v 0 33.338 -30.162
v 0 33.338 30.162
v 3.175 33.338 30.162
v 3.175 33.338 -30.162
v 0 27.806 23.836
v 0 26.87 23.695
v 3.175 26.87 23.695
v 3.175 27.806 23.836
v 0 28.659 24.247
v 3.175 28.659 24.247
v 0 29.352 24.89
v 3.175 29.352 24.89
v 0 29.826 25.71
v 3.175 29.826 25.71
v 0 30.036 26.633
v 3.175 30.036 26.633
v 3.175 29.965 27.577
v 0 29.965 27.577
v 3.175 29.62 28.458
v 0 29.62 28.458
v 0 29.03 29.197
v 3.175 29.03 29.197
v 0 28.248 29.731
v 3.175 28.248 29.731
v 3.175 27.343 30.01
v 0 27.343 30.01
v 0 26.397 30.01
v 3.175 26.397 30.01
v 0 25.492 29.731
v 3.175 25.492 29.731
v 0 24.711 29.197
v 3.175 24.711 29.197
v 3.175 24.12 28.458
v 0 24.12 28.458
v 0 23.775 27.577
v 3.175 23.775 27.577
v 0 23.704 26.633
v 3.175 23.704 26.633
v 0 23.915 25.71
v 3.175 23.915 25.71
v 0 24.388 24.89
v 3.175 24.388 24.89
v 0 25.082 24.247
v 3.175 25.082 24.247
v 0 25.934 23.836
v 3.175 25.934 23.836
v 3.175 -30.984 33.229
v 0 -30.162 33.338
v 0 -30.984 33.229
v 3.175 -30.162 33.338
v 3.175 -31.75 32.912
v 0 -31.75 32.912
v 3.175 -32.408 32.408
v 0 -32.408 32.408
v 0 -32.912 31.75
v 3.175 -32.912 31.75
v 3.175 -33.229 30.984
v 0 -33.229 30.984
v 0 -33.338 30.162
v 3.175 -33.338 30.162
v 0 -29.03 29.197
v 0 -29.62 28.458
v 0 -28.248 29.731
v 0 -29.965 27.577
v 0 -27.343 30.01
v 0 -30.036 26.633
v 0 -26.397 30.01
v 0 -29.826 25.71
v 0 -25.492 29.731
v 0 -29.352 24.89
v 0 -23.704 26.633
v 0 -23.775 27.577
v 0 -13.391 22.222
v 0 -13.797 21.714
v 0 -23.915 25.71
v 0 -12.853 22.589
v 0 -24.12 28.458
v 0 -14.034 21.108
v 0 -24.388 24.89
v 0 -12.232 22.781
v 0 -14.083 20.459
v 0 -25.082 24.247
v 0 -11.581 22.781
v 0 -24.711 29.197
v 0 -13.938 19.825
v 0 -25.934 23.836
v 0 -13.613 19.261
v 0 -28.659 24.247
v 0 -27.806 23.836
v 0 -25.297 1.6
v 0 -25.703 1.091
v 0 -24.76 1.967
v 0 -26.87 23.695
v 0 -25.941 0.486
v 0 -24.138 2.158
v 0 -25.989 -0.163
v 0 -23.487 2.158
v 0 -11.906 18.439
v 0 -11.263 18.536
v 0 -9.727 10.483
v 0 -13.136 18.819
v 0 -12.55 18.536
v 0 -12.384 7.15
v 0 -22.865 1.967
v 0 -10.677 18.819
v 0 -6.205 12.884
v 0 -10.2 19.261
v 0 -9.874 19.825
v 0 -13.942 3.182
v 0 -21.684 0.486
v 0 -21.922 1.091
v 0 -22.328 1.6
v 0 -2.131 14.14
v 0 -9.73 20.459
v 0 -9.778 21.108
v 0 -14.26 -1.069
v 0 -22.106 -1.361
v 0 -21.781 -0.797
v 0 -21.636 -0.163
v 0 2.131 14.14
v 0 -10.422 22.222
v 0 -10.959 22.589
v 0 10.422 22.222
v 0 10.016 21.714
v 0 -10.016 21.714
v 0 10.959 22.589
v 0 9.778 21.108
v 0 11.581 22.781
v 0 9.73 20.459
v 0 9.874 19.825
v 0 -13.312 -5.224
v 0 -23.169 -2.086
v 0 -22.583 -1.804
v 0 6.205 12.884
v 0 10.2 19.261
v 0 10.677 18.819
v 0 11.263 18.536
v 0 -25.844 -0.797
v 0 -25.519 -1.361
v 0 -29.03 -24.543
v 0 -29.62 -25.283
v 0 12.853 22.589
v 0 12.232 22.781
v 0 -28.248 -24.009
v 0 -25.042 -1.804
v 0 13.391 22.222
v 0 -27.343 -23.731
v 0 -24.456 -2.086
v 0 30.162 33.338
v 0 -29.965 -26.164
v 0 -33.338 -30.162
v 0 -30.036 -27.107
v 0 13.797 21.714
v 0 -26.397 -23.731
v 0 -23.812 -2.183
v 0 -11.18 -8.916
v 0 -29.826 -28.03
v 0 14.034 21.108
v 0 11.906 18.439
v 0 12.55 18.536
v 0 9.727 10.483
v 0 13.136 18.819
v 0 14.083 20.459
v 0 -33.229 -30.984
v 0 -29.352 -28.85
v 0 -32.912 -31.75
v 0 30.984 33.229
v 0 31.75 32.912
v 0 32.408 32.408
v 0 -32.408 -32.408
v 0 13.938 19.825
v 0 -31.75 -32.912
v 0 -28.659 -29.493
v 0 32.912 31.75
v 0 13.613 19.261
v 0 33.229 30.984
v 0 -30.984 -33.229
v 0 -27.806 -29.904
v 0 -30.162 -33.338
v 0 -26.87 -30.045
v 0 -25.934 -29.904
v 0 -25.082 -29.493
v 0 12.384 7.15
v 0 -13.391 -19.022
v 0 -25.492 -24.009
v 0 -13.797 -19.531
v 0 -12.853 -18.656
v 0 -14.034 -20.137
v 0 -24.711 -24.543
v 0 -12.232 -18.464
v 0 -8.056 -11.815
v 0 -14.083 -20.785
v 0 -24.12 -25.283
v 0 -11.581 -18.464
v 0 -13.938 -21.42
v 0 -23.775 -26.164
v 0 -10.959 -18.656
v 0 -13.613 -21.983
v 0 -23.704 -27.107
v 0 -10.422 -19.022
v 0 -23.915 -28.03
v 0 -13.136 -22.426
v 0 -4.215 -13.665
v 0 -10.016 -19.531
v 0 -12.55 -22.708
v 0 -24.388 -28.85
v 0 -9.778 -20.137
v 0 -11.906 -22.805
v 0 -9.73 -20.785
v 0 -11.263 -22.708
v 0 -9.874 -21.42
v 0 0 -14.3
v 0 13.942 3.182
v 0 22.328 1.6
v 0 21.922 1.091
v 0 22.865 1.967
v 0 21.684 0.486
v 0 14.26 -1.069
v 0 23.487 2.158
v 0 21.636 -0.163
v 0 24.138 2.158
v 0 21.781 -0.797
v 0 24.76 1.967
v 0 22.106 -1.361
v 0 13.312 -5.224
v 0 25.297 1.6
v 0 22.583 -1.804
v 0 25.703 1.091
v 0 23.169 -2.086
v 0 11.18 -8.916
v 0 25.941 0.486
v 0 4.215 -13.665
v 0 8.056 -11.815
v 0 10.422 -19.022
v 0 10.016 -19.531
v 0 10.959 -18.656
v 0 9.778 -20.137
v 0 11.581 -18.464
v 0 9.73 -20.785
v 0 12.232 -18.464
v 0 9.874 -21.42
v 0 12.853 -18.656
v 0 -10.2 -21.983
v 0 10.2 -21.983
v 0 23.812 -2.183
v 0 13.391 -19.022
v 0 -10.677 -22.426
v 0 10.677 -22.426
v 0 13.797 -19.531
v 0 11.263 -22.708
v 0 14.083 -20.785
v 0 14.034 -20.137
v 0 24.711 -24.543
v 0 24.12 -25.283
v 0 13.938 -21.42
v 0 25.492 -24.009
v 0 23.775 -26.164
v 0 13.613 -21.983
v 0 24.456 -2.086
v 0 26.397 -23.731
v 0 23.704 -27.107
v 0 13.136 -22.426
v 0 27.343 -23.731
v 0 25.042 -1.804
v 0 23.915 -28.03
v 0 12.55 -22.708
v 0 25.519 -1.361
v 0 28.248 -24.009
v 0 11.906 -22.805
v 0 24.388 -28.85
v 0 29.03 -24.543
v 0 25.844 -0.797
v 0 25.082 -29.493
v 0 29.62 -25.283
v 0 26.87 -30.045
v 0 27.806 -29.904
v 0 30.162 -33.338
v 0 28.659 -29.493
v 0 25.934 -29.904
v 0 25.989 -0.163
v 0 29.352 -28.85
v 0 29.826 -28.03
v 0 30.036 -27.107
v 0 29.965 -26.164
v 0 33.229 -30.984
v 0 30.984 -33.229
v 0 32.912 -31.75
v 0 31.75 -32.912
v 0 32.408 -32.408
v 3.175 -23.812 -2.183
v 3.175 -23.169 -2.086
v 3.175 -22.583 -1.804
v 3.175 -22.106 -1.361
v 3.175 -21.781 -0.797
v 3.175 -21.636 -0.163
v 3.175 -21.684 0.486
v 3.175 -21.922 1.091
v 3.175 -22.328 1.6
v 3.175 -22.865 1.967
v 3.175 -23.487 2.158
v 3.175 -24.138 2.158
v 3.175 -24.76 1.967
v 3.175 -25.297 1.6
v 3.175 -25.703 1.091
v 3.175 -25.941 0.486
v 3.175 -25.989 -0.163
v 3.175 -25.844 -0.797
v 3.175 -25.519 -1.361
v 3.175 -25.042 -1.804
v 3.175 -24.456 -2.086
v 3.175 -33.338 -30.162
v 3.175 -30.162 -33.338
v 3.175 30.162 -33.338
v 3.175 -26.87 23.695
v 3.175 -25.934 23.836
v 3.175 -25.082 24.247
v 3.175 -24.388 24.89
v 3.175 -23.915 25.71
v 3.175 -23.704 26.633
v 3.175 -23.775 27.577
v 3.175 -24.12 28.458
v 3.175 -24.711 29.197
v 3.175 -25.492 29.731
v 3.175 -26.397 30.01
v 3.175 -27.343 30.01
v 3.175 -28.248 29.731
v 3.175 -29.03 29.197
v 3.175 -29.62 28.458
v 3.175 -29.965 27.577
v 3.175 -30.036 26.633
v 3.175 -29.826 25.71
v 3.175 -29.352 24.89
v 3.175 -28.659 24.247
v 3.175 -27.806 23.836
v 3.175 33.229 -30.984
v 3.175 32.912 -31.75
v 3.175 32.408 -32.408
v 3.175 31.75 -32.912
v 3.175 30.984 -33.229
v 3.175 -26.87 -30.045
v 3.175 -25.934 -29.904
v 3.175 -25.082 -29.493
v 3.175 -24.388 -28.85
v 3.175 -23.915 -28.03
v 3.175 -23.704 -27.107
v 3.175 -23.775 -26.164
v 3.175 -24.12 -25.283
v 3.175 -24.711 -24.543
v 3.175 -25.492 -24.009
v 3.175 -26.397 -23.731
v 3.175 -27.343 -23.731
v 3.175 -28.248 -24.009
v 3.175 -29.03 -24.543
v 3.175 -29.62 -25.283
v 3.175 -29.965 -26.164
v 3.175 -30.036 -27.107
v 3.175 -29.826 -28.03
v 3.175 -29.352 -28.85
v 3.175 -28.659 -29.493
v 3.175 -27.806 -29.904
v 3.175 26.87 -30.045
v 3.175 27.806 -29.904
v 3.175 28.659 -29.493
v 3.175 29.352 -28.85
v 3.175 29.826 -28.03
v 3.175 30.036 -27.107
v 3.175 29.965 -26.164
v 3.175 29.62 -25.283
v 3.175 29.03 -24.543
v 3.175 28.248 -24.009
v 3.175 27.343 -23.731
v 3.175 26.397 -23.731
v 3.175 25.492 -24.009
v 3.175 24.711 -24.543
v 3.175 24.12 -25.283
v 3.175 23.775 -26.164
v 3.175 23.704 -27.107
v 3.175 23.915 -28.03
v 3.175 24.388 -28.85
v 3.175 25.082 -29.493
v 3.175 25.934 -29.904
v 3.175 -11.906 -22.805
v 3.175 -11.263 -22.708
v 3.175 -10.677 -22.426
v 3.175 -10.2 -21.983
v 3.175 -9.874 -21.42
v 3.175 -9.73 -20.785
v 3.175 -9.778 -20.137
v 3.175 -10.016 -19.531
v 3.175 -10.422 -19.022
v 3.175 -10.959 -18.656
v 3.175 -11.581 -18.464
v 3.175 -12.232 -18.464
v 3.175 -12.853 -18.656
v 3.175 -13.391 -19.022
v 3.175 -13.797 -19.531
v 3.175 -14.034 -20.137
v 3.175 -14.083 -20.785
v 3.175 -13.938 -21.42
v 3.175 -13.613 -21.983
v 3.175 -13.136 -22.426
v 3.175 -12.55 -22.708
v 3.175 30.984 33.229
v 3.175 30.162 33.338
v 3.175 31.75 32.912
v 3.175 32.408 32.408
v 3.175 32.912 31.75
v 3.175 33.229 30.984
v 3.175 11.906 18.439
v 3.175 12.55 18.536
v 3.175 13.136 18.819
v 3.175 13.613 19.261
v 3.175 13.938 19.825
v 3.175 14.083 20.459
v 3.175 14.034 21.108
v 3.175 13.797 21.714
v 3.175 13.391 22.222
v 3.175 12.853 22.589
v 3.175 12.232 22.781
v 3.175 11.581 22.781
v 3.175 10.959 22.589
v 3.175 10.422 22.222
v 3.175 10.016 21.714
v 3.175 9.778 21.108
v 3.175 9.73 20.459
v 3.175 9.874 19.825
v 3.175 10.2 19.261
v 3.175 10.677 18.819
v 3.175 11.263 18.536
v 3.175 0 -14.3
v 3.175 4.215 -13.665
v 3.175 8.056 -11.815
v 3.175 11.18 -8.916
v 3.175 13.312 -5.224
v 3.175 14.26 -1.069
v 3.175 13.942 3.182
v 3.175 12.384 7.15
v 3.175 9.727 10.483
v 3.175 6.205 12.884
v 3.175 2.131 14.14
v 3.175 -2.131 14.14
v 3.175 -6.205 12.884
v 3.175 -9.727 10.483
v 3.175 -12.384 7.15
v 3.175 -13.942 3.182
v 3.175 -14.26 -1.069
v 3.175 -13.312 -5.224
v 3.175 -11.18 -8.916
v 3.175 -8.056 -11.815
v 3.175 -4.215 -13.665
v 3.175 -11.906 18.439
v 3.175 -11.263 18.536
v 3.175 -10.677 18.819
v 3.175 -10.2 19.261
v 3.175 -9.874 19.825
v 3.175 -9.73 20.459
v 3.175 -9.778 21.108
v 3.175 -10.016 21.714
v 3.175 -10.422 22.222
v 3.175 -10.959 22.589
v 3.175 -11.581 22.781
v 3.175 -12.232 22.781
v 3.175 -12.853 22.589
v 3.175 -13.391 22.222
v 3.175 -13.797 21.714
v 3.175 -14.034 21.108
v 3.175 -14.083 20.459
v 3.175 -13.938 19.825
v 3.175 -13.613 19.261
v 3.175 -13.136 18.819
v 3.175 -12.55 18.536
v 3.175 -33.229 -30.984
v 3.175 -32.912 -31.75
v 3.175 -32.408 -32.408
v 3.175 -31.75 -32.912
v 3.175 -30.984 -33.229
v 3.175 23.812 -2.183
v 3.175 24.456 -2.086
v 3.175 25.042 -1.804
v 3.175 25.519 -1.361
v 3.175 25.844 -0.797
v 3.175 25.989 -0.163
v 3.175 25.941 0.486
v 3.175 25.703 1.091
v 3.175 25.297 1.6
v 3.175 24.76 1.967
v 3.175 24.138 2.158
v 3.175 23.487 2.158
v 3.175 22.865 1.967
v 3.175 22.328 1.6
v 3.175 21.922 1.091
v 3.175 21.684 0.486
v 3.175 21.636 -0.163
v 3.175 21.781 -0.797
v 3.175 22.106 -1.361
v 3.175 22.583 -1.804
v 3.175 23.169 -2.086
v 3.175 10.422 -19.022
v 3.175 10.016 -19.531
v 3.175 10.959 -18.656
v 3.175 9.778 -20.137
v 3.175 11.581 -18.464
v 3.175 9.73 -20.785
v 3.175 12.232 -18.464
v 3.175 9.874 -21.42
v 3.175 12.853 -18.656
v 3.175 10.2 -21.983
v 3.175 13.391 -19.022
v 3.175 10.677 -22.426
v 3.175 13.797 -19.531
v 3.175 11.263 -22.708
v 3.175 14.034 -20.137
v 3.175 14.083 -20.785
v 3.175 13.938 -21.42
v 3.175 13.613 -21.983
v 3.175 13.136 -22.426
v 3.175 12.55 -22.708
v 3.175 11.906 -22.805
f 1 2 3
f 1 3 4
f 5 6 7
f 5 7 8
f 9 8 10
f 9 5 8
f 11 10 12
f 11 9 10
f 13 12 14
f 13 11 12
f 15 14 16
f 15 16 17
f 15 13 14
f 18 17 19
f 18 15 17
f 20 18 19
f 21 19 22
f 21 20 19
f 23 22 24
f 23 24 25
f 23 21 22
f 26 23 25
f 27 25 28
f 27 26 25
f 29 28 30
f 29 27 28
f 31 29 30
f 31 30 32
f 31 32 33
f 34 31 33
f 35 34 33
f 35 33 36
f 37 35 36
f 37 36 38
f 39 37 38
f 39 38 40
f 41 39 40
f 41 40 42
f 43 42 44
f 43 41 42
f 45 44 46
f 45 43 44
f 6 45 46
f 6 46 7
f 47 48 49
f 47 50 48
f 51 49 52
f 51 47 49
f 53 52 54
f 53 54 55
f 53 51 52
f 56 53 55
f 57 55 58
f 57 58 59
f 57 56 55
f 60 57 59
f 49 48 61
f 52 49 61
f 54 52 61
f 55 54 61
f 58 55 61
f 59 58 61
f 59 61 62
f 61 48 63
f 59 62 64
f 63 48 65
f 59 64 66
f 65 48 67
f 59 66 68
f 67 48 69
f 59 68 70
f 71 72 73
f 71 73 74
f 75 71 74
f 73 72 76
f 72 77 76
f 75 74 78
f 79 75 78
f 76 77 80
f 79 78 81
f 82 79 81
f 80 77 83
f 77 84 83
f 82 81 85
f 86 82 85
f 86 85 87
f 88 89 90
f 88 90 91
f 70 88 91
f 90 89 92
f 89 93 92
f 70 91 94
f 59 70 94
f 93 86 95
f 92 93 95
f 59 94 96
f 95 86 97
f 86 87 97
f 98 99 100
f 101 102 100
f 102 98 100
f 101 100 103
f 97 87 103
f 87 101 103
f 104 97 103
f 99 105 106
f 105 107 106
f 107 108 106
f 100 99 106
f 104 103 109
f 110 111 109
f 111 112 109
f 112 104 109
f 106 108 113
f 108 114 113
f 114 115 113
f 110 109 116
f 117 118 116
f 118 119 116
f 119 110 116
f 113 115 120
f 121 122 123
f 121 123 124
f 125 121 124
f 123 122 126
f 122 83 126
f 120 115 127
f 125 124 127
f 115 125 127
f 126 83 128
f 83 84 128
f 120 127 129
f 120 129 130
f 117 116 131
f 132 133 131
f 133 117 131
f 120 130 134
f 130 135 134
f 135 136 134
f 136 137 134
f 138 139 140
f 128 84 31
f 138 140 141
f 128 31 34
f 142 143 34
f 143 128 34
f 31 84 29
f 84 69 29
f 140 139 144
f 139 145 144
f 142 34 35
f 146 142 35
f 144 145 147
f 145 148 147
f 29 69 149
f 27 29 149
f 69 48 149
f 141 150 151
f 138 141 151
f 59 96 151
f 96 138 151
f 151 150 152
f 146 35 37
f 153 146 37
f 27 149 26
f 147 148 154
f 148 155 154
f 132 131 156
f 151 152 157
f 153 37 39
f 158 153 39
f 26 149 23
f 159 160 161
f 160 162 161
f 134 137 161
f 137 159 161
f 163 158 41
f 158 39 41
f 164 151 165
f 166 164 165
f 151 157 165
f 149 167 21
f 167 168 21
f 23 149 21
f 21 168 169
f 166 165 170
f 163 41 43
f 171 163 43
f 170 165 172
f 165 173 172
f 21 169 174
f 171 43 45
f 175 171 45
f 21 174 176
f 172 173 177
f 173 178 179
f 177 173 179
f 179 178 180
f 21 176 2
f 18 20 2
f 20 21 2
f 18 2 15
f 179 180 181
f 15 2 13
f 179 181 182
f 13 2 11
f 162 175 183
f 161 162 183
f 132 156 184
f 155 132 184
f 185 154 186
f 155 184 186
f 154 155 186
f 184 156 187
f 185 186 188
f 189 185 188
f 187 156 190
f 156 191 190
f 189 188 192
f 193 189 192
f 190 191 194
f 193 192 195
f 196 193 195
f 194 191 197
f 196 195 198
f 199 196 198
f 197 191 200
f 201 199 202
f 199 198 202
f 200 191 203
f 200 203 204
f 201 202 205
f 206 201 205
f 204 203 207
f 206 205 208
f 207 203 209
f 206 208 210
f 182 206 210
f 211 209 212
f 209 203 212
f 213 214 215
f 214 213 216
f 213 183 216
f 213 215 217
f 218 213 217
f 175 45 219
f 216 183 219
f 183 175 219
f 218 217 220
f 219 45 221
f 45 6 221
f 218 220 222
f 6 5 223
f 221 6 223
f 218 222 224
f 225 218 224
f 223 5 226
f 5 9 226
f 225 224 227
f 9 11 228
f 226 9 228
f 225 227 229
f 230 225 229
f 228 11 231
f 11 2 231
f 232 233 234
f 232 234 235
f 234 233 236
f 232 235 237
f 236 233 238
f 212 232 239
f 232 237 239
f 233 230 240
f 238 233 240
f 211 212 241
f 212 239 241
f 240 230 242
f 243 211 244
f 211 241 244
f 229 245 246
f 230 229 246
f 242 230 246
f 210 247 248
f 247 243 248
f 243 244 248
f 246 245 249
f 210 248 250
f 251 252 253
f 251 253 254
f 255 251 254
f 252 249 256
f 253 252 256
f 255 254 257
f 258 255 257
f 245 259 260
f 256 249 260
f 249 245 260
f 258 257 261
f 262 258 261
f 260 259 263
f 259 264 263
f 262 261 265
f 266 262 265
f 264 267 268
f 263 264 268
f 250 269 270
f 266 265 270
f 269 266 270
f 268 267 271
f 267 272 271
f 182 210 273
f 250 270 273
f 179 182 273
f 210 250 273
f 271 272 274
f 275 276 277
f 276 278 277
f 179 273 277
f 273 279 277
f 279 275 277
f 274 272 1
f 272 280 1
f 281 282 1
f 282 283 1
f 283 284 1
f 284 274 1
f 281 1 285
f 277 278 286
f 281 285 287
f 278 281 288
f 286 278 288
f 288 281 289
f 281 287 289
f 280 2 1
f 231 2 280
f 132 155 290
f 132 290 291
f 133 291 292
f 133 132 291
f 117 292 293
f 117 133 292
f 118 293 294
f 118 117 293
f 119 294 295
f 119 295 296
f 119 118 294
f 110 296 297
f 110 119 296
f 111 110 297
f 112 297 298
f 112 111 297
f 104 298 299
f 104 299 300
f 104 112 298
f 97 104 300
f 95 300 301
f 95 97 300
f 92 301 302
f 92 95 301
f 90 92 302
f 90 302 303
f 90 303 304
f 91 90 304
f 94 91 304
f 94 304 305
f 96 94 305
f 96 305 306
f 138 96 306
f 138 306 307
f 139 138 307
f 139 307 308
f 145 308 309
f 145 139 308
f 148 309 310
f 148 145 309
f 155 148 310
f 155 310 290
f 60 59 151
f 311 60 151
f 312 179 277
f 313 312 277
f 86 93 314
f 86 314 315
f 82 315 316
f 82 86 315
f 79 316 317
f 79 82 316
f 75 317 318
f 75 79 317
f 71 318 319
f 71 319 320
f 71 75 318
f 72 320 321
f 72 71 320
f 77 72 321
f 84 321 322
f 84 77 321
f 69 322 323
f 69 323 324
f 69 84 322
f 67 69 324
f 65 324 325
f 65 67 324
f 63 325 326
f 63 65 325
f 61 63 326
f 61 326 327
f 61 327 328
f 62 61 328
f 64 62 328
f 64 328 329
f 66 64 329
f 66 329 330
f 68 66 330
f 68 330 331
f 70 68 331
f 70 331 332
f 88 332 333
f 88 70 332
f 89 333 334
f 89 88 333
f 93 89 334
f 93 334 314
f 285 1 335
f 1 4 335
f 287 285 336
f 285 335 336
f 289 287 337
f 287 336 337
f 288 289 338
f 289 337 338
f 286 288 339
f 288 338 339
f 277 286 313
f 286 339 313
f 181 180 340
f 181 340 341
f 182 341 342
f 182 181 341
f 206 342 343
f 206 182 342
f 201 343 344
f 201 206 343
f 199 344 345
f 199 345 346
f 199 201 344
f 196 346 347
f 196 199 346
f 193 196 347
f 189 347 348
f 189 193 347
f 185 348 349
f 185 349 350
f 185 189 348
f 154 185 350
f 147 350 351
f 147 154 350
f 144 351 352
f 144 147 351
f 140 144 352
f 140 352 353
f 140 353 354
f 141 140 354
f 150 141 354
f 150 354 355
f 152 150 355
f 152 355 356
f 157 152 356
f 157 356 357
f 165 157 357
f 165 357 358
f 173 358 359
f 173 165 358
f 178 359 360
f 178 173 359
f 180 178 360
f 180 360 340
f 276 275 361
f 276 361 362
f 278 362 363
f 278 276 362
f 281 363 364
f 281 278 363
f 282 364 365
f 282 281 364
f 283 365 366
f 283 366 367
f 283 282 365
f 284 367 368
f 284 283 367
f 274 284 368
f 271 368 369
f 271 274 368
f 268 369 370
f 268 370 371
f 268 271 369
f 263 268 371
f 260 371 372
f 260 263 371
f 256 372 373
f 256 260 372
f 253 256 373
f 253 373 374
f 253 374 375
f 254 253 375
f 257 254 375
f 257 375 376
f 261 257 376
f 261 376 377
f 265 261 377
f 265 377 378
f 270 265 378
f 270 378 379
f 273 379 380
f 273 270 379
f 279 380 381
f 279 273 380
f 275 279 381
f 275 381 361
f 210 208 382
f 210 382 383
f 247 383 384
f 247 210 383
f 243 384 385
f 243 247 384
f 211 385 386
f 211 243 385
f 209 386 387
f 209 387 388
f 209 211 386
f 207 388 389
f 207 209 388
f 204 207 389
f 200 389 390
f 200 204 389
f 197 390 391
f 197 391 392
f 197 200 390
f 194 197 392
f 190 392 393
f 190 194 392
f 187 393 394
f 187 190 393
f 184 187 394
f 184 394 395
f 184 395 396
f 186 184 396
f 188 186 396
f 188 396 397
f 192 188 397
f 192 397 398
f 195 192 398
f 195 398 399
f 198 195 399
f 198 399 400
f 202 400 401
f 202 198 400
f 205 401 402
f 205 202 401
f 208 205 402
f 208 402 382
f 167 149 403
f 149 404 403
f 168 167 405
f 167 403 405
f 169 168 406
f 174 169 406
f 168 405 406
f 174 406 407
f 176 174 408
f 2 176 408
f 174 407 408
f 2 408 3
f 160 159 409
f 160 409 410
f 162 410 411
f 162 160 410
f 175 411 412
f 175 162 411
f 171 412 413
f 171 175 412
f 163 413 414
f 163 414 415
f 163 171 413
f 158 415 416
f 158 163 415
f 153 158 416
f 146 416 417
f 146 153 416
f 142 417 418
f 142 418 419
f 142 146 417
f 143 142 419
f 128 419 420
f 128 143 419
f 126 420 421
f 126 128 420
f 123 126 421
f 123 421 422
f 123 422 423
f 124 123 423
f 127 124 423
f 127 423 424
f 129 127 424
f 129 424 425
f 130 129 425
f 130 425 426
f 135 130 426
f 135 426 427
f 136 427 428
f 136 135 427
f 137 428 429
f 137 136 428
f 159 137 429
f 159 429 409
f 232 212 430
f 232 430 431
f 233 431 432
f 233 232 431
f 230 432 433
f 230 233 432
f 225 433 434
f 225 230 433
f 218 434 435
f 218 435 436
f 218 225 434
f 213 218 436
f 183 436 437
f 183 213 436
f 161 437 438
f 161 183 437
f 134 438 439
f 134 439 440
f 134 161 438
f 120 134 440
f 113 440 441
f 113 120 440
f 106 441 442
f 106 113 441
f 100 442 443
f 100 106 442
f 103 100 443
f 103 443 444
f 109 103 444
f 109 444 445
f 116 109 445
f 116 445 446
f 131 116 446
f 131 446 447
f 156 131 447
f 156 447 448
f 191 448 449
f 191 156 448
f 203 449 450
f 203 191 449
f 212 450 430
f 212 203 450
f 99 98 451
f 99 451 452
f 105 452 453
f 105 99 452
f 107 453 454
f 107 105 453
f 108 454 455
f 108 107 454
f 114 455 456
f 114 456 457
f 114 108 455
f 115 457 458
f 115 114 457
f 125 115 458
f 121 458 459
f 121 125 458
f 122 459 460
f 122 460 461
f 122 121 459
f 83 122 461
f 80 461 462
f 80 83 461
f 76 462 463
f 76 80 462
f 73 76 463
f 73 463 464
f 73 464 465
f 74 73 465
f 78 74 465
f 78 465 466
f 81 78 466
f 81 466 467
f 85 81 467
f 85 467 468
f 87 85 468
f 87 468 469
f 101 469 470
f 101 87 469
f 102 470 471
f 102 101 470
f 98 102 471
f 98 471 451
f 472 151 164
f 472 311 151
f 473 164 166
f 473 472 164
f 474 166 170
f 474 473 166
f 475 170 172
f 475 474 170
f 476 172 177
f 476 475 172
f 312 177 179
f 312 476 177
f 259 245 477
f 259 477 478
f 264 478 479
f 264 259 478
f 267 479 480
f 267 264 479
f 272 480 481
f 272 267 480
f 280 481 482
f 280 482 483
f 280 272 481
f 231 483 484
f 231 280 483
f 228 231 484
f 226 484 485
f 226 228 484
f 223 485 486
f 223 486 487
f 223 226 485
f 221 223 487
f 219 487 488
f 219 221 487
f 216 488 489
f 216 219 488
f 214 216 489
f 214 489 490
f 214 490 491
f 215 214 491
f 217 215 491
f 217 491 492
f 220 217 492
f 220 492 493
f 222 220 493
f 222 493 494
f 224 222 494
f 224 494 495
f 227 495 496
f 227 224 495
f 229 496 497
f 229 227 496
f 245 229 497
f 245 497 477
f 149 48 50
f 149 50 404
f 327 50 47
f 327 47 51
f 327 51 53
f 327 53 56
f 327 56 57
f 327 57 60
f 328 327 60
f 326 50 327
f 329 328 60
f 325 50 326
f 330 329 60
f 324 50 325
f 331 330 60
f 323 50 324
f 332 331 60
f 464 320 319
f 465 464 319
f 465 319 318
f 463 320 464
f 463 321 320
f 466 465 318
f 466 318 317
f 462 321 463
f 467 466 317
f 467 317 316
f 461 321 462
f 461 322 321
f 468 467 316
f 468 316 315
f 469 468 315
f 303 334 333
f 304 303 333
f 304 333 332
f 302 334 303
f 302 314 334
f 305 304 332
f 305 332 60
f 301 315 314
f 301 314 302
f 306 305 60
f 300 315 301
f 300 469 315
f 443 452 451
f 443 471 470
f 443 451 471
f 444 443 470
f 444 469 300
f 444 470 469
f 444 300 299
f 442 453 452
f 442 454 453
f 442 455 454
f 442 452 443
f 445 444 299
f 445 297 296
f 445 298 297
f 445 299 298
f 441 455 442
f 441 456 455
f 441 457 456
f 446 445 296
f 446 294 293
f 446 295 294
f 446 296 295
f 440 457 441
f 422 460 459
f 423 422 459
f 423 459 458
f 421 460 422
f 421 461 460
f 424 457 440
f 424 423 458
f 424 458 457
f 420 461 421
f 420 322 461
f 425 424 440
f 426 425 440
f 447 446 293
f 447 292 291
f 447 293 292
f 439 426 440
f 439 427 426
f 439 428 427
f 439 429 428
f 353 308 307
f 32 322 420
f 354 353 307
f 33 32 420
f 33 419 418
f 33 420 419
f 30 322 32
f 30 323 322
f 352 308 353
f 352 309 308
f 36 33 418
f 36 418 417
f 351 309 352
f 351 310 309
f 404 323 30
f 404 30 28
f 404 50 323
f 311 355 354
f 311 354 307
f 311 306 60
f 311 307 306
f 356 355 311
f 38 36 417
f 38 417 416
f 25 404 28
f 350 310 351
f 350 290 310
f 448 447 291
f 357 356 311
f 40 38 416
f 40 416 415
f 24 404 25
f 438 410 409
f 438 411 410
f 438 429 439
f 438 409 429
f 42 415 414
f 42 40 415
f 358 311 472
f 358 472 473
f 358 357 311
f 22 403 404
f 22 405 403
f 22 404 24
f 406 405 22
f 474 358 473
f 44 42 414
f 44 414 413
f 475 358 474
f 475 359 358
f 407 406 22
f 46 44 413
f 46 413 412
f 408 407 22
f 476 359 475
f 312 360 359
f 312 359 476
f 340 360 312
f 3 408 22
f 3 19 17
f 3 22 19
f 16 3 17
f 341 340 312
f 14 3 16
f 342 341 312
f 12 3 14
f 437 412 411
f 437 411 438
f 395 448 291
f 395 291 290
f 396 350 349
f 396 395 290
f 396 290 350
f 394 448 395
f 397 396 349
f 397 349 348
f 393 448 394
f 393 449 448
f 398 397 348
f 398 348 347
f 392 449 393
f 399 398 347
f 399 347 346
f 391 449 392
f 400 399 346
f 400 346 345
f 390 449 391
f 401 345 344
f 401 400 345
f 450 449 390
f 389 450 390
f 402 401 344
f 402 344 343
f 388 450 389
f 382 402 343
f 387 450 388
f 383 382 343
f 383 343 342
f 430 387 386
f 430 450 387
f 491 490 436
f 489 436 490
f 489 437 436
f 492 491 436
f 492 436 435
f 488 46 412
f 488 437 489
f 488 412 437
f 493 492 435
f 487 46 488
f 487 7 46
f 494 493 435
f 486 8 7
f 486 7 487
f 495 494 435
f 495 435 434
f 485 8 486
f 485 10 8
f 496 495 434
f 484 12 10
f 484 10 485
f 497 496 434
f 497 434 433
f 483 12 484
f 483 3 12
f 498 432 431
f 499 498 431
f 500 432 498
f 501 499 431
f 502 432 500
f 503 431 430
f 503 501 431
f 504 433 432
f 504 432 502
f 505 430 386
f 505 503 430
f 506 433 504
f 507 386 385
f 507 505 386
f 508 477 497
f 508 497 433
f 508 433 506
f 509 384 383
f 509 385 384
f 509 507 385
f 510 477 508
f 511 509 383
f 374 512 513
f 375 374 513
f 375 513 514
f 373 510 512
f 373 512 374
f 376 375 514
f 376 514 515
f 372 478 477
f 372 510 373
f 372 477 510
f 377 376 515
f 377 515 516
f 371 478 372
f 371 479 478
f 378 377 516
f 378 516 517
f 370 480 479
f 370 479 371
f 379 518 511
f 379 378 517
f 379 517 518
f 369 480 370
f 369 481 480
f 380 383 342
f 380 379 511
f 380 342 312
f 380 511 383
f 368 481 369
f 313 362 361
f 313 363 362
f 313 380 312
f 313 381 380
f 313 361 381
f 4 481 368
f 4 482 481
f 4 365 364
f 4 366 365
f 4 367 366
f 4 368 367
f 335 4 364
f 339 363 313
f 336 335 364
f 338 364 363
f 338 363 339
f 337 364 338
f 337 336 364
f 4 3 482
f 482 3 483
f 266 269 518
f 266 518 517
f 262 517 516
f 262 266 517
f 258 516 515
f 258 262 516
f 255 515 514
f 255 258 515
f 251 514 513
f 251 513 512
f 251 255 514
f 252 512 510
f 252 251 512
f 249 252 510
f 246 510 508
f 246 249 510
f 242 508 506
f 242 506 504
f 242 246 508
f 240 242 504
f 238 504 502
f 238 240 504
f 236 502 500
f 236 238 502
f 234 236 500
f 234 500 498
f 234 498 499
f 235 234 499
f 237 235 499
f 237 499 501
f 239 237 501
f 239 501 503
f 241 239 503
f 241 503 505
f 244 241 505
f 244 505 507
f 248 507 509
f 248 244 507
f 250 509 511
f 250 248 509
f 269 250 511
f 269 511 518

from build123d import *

# Parameters (mm, degrees)
SKETCH1_W           = 66.675
SKETCH1_H           = 66.675
SKETCH1_R           = 3.175
SKETCH1_R_2         = 14.3002
SKETCH1_R_3         = 2.1828125
BOSS_EXTRUDE1_DEPTH = 3.175
FILLET1_R           = 3.175


with BuildPart() as part:
    # Sketch1 → Boss-Extrude1 (new body)
    with BuildSketch(Plane(origin=(0, 0, 0), x_dir=(0, 0, -1), z_dir=(1, 0, 0))):
        Rectangle(SKETCH1_W, SKETCH1_H)
        with Locations((-26.870057685, 26.870057685)):
            Circle(SKETCH1_R, mode=Mode.SUBTRACT)
        with Locations((26.870057685, 26.870057685)):
            Circle(SKETCH1_R, mode=Mode.SUBTRACT)
        with Locations((26.870057685, -26.870057685)):
            Circle(SKETCH1_R, mode=Mode.SUBTRACT)
        with Locations((-26.870057685, -26.870057685)):
            Circle(SKETCH1_R, mode=Mode.SUBTRACT)
        Circle(SKETCH1_R_2, mode=Mode.SUBTRACT)
        with Locations((0, 23.8125)):
            Circle(SKETCH1_R_3, mode=Mode.SUBTRACT)
        with Locations((20.622229928, 11.90625)):
            Circle(SKETCH1_R_3, mode=Mode.SUBTRACT)
        with Locations((20.622229928, -11.90625)):
            Circle(SKETCH1_R_3, mode=Mode.SUBTRACT)
        with Locations((0, -23.8125)):
            Circle(SKETCH1_R_3, mode=Mode.SUBTRACT)
        with Locations((-20.622229928, -11.90625)):
            Circle(SKETCH1_R_3, mode=Mode.SUBTRACT)
        with Locations((-20.622229928, 11.90625)):
            Circle(SKETCH1_R_3, mode=Mode.SUBTRACT)
    extrude(amount=BOSS_EXTRUDE1_DEPTH)

    # Fillet1
    fillet1_edges = [part.edges().sort_by_distance(p)[0] for p in [
        (1.5875, -33.3375, -33.3375),
        (1.5875, -33.3375, 33.3375),
        (1.5875, 33.3375, 33.3375),
        (1.5875, 33.3375, -33.3375),
    ]]
    fillet(fillet1_edges, radius=FILLET1_R)


solid = part.part
